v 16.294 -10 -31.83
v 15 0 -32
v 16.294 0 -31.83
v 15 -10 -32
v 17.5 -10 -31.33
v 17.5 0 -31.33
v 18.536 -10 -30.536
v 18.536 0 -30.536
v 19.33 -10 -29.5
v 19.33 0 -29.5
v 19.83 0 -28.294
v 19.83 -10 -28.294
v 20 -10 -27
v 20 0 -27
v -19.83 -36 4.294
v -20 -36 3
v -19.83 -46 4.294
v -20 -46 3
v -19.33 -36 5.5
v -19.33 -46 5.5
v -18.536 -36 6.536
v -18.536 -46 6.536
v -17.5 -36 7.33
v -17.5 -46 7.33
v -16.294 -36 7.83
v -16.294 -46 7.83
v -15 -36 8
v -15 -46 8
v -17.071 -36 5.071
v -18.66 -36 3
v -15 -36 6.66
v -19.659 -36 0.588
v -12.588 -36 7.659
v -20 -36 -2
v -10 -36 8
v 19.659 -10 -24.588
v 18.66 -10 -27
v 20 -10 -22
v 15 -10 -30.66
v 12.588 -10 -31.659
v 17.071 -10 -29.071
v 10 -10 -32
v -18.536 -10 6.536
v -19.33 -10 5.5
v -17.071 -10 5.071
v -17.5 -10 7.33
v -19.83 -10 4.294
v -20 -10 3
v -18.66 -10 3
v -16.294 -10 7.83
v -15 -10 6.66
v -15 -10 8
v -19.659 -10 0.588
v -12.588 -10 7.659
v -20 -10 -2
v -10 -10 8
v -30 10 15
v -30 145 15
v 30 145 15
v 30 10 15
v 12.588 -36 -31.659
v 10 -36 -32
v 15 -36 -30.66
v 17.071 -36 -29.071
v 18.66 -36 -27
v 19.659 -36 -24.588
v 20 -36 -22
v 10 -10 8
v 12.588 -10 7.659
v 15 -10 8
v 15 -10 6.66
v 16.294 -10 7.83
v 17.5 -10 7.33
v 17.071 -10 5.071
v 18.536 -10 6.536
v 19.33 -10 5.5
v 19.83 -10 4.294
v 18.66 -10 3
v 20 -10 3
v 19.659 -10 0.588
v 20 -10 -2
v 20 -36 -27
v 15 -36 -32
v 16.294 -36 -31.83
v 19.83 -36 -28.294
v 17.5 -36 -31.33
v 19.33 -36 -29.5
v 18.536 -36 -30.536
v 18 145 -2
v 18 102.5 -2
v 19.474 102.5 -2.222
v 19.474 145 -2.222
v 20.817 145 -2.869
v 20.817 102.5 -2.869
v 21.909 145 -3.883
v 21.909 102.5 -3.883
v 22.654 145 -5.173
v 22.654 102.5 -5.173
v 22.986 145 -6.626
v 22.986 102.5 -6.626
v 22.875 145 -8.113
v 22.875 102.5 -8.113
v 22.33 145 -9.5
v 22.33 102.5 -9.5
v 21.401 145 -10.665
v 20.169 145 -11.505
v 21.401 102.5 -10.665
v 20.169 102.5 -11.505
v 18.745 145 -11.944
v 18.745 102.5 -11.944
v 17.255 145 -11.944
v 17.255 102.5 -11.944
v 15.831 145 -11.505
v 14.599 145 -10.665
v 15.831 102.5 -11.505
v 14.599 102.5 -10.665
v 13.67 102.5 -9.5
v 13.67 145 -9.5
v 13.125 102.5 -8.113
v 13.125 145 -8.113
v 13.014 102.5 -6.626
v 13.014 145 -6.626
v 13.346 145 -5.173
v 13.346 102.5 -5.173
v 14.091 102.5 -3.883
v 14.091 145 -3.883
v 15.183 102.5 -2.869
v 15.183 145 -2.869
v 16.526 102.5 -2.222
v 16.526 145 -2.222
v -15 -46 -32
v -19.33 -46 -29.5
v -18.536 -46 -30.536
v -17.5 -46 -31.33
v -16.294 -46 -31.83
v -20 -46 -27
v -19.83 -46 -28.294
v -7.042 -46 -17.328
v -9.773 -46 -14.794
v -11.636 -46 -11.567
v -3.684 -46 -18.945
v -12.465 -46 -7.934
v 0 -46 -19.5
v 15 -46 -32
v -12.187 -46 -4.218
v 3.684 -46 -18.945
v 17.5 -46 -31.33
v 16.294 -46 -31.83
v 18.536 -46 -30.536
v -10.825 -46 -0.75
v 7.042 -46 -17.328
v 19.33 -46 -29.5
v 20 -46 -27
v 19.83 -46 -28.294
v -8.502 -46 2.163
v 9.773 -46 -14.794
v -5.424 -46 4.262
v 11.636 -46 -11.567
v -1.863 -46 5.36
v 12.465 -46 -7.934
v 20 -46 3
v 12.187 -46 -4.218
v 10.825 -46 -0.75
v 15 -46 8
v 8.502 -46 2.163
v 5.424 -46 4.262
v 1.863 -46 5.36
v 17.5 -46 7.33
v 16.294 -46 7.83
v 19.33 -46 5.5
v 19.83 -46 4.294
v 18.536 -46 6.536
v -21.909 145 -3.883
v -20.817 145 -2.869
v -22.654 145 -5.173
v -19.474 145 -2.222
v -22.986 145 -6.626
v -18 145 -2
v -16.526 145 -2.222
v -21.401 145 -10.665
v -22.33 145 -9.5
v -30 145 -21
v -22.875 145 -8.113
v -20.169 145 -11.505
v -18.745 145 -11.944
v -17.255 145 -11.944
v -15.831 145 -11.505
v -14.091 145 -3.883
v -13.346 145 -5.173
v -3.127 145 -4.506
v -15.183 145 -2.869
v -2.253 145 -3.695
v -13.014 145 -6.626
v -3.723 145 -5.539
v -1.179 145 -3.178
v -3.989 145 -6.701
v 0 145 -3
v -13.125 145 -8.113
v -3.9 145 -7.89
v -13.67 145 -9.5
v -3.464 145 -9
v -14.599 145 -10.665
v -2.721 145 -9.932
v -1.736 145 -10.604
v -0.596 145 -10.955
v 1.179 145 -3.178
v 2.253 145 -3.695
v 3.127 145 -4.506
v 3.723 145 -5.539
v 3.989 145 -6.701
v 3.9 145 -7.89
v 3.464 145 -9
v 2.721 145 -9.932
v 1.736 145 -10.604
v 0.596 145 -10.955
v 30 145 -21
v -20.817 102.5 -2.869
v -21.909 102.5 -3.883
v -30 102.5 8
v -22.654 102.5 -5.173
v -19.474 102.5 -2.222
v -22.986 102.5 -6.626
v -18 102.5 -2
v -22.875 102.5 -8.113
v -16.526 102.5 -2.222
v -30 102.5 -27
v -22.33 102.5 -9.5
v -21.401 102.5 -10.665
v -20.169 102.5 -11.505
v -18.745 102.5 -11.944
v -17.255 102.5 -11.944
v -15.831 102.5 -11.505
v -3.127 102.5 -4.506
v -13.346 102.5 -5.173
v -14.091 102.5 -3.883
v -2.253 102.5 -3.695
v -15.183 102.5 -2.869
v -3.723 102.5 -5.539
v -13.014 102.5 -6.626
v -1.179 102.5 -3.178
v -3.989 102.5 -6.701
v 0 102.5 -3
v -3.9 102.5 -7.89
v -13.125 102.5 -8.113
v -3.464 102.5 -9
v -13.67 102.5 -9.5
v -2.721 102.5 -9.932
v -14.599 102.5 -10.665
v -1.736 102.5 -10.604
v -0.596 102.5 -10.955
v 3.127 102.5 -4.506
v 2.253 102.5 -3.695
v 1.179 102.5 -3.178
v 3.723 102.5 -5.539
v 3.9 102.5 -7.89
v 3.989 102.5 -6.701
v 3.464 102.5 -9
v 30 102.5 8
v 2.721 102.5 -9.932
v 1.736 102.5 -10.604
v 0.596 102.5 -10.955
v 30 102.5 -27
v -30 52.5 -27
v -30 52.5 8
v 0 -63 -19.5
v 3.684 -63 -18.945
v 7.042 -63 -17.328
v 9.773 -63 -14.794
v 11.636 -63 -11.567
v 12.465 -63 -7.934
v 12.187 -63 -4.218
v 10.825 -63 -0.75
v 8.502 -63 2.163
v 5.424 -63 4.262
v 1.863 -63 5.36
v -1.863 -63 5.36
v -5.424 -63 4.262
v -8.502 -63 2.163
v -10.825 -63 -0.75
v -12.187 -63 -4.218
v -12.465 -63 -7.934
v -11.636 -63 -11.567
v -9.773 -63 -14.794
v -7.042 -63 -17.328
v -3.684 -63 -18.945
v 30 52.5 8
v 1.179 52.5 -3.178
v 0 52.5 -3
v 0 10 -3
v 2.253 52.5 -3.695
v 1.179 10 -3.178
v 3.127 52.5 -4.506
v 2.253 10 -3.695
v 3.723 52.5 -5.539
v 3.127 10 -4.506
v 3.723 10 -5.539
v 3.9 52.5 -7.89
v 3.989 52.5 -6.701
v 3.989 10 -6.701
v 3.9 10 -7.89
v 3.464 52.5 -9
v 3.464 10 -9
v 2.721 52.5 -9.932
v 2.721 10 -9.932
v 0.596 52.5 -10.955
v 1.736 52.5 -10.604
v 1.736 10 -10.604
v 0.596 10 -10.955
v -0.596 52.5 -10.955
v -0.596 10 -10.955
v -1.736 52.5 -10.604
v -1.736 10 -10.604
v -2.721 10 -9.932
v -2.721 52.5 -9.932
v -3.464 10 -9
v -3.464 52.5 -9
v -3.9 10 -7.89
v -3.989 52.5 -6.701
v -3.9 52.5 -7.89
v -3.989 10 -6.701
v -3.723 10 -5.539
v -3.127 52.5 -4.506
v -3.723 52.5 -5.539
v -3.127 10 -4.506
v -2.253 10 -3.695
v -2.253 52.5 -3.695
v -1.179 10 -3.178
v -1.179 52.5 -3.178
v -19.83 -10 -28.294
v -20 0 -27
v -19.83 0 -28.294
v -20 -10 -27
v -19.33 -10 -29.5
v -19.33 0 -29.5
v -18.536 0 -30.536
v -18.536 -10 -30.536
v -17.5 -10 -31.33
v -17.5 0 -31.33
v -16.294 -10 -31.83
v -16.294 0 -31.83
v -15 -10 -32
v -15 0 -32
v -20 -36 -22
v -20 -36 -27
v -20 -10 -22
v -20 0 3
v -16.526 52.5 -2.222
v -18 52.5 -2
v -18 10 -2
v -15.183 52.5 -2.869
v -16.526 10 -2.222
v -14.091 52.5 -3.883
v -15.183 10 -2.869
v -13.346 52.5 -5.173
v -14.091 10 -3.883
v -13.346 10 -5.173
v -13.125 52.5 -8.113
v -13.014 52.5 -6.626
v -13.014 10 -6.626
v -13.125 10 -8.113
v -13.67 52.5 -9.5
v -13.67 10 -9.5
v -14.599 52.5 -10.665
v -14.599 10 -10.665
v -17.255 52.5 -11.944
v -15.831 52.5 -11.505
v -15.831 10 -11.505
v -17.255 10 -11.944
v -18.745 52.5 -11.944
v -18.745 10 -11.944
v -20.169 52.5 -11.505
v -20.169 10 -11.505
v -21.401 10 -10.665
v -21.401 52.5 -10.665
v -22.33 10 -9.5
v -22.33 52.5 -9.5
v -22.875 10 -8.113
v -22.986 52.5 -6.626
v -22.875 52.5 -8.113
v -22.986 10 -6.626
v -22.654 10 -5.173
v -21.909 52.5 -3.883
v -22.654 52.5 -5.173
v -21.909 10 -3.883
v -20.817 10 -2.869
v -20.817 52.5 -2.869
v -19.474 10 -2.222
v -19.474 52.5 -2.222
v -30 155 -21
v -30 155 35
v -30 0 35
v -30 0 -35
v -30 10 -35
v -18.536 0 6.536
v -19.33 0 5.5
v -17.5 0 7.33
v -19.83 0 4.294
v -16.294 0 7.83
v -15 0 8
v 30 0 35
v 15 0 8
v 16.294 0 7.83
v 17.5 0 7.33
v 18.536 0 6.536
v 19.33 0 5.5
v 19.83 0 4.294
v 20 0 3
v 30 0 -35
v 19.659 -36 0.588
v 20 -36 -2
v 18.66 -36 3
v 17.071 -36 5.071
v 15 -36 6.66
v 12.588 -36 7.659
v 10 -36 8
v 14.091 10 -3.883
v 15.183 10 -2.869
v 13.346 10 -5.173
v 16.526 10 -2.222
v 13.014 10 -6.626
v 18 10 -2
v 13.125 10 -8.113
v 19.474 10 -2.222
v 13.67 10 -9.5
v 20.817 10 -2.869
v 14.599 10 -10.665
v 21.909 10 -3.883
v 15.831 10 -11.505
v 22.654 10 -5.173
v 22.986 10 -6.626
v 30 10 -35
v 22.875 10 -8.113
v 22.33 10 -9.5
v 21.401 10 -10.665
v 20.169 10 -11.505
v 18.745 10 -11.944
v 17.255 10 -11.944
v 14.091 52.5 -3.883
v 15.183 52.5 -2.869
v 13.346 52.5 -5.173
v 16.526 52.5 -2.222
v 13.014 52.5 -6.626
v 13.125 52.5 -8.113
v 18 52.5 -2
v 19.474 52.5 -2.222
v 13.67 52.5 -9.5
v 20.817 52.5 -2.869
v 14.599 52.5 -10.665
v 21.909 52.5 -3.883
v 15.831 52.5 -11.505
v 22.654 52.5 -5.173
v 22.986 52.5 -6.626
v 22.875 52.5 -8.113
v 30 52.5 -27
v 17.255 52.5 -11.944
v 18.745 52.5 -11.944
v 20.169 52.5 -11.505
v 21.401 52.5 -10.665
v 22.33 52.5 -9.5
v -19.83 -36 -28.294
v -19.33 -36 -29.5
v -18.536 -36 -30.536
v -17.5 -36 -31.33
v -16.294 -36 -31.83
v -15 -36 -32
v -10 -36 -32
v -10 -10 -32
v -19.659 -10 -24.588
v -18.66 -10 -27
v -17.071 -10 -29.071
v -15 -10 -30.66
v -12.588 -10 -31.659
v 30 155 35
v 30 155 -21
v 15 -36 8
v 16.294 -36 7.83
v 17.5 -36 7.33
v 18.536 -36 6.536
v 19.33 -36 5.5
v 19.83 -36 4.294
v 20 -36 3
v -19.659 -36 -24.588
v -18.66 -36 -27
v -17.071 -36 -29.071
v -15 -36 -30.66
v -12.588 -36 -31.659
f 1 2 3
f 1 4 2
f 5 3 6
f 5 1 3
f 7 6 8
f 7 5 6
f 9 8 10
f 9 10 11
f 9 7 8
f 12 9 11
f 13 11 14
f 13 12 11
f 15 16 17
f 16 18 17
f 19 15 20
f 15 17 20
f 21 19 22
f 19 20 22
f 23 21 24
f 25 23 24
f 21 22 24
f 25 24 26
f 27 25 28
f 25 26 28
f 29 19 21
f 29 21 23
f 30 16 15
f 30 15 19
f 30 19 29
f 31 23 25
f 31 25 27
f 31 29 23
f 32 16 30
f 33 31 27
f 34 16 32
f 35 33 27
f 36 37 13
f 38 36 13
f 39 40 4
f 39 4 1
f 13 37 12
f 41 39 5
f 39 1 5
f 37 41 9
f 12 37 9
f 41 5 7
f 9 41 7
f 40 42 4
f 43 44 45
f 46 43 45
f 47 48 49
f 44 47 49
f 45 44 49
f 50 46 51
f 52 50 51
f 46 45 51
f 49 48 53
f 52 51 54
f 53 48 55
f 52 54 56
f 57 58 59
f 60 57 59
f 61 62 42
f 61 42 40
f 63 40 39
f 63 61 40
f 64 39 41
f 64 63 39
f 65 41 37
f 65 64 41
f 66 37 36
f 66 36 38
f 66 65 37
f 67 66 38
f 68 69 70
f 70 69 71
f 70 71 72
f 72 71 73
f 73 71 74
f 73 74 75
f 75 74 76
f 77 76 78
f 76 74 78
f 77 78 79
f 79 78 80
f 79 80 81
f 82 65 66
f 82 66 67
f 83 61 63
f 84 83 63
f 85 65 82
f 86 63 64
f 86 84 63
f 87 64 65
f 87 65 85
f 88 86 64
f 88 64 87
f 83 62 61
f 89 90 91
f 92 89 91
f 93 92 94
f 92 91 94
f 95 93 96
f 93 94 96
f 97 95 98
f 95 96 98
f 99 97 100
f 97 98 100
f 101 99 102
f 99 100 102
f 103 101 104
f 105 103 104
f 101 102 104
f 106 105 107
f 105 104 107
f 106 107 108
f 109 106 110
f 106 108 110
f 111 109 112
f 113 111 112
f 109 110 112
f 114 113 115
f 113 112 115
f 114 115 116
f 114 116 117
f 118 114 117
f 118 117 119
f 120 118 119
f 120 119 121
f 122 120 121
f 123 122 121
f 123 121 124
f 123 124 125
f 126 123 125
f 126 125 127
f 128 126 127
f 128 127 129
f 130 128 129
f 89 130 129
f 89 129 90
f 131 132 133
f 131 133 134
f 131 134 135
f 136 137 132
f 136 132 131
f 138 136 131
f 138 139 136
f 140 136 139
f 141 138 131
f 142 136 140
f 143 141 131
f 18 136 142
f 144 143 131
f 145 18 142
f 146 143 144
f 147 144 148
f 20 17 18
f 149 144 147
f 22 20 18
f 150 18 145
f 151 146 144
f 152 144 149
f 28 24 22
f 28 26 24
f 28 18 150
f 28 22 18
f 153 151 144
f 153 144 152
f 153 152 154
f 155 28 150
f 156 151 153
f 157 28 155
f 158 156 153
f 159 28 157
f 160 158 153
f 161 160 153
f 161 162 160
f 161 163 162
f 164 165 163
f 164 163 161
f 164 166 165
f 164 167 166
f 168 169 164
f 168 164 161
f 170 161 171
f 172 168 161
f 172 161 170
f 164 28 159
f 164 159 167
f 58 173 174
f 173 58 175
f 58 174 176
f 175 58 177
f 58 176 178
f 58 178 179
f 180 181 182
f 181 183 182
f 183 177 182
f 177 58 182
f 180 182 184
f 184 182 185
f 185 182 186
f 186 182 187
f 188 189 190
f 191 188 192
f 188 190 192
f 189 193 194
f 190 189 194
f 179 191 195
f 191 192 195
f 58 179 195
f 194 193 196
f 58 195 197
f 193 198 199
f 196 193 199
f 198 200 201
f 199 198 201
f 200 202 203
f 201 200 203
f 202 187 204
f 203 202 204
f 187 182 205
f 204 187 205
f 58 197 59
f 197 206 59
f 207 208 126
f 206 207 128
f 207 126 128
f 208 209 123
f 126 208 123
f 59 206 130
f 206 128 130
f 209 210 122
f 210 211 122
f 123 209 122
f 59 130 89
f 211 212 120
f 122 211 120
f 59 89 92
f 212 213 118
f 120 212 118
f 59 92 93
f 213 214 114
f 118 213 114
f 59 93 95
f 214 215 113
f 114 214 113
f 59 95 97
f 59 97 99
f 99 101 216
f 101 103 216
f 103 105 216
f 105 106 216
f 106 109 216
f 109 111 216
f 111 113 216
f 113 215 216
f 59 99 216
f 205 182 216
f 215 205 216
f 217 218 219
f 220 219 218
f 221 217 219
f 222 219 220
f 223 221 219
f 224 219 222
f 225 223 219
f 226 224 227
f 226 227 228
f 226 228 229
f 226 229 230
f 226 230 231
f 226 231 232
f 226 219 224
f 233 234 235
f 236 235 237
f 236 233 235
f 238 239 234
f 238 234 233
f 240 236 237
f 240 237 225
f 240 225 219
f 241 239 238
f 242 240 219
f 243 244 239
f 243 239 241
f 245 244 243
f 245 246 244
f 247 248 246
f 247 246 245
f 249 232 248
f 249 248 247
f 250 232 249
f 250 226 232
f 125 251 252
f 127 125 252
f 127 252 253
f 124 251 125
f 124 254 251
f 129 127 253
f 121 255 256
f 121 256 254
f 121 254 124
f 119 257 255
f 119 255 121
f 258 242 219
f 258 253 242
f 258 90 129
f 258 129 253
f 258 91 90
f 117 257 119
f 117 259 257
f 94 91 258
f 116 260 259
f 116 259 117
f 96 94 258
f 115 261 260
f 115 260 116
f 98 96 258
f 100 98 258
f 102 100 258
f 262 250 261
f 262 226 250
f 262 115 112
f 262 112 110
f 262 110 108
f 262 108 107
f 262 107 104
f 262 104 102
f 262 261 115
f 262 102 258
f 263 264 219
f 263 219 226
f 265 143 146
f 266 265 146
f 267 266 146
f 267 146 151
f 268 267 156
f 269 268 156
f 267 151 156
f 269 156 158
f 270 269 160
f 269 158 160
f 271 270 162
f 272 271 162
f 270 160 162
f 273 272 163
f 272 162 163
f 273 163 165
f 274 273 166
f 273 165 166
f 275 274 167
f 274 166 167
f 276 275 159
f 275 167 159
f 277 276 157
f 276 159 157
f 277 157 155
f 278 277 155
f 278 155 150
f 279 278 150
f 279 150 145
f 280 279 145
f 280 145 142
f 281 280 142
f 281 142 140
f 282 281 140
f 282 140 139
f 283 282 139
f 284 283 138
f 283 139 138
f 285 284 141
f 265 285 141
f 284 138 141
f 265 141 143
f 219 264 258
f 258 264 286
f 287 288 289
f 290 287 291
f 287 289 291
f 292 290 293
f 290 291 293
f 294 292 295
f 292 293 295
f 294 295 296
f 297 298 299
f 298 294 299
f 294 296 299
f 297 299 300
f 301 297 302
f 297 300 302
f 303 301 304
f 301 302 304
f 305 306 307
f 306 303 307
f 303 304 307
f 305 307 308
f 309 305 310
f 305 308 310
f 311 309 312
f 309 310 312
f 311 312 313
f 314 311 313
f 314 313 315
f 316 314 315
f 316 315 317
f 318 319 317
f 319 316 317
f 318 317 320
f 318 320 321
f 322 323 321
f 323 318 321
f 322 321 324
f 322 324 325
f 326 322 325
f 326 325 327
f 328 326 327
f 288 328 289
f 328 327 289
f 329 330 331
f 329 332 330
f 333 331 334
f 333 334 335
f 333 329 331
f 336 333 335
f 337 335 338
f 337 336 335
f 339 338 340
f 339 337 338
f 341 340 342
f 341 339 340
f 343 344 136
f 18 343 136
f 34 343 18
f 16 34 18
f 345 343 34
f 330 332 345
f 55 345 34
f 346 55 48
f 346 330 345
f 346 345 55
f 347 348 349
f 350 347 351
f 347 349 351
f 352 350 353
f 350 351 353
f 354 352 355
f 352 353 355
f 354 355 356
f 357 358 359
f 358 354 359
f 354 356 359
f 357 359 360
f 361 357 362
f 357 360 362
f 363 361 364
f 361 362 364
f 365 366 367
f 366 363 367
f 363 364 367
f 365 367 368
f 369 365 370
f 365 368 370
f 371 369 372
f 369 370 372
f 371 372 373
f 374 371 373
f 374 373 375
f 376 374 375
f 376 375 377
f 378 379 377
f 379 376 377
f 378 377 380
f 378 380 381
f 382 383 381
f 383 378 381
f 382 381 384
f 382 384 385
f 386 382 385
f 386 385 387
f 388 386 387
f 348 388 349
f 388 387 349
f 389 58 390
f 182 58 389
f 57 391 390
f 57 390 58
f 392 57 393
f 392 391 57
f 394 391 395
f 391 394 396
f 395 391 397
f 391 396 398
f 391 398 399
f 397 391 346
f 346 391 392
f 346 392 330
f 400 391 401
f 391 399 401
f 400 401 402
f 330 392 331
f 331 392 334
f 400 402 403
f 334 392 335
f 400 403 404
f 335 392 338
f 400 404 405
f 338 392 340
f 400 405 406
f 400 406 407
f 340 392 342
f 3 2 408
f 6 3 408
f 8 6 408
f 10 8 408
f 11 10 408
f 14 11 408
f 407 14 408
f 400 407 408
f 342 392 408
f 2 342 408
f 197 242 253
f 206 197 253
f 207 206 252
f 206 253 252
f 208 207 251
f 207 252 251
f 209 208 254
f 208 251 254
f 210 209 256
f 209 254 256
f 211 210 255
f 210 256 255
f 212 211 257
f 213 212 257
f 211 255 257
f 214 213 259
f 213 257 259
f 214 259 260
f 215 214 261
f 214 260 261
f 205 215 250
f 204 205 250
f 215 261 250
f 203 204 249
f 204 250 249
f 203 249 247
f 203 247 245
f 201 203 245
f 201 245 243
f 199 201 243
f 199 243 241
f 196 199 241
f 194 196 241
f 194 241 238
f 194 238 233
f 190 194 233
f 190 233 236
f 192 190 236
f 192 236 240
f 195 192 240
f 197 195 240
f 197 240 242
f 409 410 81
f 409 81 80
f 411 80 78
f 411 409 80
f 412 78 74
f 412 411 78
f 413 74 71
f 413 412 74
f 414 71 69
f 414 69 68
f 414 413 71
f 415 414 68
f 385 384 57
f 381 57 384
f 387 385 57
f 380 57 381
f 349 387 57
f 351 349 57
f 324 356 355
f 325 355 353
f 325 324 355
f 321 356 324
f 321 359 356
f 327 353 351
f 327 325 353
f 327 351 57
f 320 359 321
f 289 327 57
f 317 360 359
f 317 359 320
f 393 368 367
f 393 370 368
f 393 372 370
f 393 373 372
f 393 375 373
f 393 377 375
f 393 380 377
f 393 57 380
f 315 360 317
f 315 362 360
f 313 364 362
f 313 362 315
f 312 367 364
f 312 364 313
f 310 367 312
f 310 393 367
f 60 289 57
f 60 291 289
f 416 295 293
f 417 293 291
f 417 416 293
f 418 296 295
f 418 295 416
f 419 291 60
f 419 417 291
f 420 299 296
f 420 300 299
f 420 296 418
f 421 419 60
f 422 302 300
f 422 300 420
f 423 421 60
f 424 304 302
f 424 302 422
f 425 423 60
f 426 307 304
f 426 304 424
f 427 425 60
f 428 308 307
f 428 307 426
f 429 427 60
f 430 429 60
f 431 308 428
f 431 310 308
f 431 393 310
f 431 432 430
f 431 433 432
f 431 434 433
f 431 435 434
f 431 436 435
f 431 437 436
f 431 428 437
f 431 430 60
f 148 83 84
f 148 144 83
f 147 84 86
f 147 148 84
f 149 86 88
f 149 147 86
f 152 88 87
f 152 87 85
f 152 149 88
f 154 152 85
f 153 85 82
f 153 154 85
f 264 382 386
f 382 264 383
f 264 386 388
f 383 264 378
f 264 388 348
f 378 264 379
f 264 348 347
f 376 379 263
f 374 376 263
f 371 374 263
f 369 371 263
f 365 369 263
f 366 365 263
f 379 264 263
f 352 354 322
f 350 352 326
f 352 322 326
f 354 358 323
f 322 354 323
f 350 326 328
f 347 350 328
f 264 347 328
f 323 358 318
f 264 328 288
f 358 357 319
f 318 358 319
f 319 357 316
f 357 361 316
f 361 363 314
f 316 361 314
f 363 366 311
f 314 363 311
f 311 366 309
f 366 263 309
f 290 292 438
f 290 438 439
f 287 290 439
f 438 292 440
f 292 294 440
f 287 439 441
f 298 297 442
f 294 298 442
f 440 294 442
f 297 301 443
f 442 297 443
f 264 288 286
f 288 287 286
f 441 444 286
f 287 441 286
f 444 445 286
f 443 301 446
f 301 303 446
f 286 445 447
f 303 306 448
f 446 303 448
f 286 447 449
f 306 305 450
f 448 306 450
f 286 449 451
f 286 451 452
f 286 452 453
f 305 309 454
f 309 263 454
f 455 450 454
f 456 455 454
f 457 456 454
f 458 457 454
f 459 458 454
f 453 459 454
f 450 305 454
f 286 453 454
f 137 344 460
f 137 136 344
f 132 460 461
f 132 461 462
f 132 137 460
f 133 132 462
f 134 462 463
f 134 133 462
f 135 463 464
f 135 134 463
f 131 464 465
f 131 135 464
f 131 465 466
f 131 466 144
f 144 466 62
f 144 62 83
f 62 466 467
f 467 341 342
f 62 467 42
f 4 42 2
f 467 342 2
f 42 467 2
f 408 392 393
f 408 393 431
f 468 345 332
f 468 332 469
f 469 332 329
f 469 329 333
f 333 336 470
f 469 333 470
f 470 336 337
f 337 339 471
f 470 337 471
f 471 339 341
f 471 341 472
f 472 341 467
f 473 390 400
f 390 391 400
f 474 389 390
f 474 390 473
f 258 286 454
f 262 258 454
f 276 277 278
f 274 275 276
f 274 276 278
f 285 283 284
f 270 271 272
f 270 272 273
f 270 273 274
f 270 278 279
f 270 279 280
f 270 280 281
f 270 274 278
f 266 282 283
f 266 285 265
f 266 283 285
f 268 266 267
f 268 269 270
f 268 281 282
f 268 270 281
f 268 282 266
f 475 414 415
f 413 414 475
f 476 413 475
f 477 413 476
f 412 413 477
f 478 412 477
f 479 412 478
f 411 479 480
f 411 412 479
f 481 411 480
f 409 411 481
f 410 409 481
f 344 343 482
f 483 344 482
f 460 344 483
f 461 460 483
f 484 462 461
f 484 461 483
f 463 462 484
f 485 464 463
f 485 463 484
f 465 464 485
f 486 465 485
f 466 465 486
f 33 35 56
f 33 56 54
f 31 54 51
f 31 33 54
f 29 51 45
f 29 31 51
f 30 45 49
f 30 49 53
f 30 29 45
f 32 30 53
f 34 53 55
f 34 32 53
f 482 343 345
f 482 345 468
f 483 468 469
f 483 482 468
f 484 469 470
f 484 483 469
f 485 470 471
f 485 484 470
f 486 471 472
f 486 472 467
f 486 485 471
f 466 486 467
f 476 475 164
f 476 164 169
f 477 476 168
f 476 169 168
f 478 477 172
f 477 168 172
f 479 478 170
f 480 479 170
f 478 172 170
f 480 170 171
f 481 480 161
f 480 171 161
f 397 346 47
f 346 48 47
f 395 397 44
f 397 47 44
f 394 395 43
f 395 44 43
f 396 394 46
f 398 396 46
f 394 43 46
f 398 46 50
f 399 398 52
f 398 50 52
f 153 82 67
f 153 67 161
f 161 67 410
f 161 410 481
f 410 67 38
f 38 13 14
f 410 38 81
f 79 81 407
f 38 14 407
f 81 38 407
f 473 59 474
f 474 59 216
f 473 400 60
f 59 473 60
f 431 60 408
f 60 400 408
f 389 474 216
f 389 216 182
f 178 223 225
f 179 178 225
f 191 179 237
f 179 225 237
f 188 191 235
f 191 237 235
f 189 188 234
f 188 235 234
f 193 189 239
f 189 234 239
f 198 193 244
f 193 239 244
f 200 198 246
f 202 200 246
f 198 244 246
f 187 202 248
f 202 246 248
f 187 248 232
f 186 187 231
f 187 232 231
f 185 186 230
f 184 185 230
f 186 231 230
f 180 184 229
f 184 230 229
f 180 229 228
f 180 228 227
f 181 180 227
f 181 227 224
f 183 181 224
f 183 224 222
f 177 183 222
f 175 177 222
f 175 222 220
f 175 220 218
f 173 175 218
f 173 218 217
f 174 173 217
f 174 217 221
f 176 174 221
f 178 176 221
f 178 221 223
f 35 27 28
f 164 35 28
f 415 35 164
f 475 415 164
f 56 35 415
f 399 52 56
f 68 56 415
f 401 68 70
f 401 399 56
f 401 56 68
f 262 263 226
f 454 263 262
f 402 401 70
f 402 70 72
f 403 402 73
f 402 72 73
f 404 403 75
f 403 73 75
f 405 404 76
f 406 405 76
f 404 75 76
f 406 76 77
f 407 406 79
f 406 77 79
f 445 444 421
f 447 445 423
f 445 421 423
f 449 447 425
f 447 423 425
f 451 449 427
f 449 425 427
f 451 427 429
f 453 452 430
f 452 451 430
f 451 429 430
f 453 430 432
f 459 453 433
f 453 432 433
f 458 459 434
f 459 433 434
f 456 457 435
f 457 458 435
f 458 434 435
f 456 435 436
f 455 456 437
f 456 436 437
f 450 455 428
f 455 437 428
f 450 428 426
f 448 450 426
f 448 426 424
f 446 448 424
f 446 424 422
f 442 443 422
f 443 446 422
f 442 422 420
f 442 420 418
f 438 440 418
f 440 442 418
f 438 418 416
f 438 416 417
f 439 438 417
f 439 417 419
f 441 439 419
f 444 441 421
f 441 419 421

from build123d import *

# Parameters (mm, degrees)
SKETCH1_W           = 60
SKETCH1_H           = 70
BOSS_EXTRUDE1_DEPTH = 10
SKETCH2_R           = 5
BOSS_EXTRUDE2_DEPTH = 135
SKETCH3_W           = 60
SKETCH3_H           = 70
BOSS_EXTRUDE3_DEPTH = 10
SKETCH4_R           = 4
BOSS_EXTRUDE4_DEPTH = 135
SKETCH6_W           = 60
SKETCH6_H           = 20
BOSS_EXTRUDE5_DEPTH = 135
SKETCH7_W           = 40
SKETCH7_H           = 40
BOSS_EXTRUDE6_DEPTH = 46
SKETCH8_R           = 12.5
BOSS_EXTRUDE7_DEPTH = 17
FILLET1_START       = -36
FILLET1_DEPTH       = 26
FILLET2_R           = 5
FILLET3_START       = -36
FILLET3_DEPTH       = 26
FILLET4_R           = 5
SKETCH9_W           = 60
SKETCH9_H           = 35
BOSS_EXTRUDE8_DEPTH = 50
SKETCH10_W          = 60
SKETCH10_H          = 10
CUT_EXTRUDE1_DEPTH  = 14


with BuildPart() as part:
    # Sketch1 → Boss-Extrude1 (new body)
    with BuildSketch(Plane(origin=(0, 0, 0), x_dir=(1, 0, 0), z_dir=(0, 1, 0))):
        Rectangle(SKETCH1_W, SKETCH1_H)
    extrude(amount=BOSS_EXTRUDE1_DEPTH)

    # Sketch2 → Boss-Extrude2 (add)
    with BuildSketch(Plane(origin=(0, 10, 0), x_dir=(1, 0, 0), z_dir=(0, 1, 0))):
        with Locations(Location((-18, 7, 0), (0, 0, 270))):
            Circle(SKETCH2_R)
        with Locations(Location((18, 7, 0), (0, 0, 270))):
            Circle(SKETCH2_R)
    extrude(amount=BOSS_EXTRUDE2_DEPTH)

    # Sketch3 → Boss-Extrude3 (add)
    with BuildSketch(Plane(origin=(0, 145, 0), x_dir=(1, 0, 0), z_dir=(0, 1, 0))):
        Rectangle(SKETCH3_W, SKETCH3_H)
    extrude(amount=BOSS_EXTRUDE3_DEPTH)

    # Sketch4 → Boss-Extrude4 (add)
    with BuildSketch(Plane(origin=(0, 10, 0), x_dir=(1, 0, 0), z_dir=(0, 1, 0))):
        with Locations(Location((0, 7, 0), (0, 0, 270))):
            Circle(SKETCH4_R)
    extrude(amount=BOSS_EXTRUDE4_DEPTH)

    # Sketch6 → Boss-Extrude5 (add)
    with BuildSketch(Plane(origin=(0, 10, 0), x_dir=(1, 0, 0), z_dir=(0, 1, 0))):
        with Locations((0, -25)):
            Rectangle(SKETCH6_W, SKETCH6_H)
    extrude(amount=BOSS_EXTRUDE5_DEPTH)

    # Sketch7 → Boss-Extrude6 (add)
    with BuildSketch(Plane.XZ):
        with Locations((0, -12)):
            Rectangle(SKETCH7_W, SKETCH7_H)
    extrude(amount=BOSS_EXTRUDE6_DEPTH)

    # Sketch8 → Boss-Extrude7 (add)
    with BuildSketch(Plane.XZ.offset(46)):
        with Locations(Location((0, -7, 0), (0, 0, 270))):
            Circle(SKETCH8_R)
    extrude(amount=BOSS_EXTRUDE7_DEPTH)

    # Fillet1: read off the stored shape, not the designer's step
    # Fillet1 outline → Fillet1 (cut)
    with BuildSketch(Plane(origin=(0, 0, 0), x_dir=(1, 0, 0), z_dir=(0, 1, 0)).offset(FILLET1_START)):
        with BuildLine():
            Line((-20, 32), (-20, 22))
            ThreePointArc((-20, 22), (-17.071067812, 29.071067812), (-10, 32))
            Line((-10, 32), (-20, 32))
        make_face()
    extrude(amount=FILLET1_DEPTH, mode=Mode.SUBTRACT)

    # Fillet2
    fillet2_edges = [part.edges().sort_by_distance(p)[0] for p in [
        (-20, -41, -32),
        (-20, -5, -32),
    ]]
    fillet(fillet2_edges, radius=FILLET2_R)

    # Fillet3: read off the stored shape, not the designer's step
    # Fillet3 outline → Fillet3 (cut)
    with BuildSketch(Plane(origin=(0, 0, 0), x_dir=(1, 0, 0), z_dir=(0, 1, 0)).offset(FILLET3_START)):
        with BuildLine():
            ThreePointArc((10, 32), (17.071067812, 29.071067812), (20, 22))
            Line((20, 22), (20, 32))
            Line((20, 32), (10, 32))
        make_face()
        with BuildLine():
            ThreePointArc((20, 2), (17.071067812, -5.071067812), (10, -8))
            Line((10, -8), (20, -8))
            Line((20, -8), (20, 2))
        make_face()
        with BuildLine():
            ThreePointArc((-10, -8), (-17.071067812, -5.071067812), (-20, 2))
            Line((-20, 2), (-20, -8))
            Line((-20, -8), (-10, -8))
        make_face()
    extrude(amount=FILLET3_DEPTH, mode=Mode.SUBTRACT)

    # Fillet4
    fillet4_edges = [part.edges().sort_by_distance(p)[0] for p in [
        (20, -41, -32),
        (20, -41, 8),
        (-20, -41, 8),
        (20, -5, 8),
        (20, -5, -32),
        (-20, -5, 8),
    ]]
    fillet(fillet4_edges, radius=FILLET4_R)

    # Sketch9 → Boss-Extrude8 (add)
    with BuildSketch(Plane(origin=(0, 52.5, 0), x_dir=(1, 0, 0), z_dir=(0, 1, 0))):
        with Locations((0, 9.5)):
            Rectangle(SKETCH9_W, SKETCH9_H)
    extrude(amount=BOSS_EXTRUDE8_DEPTH)

    # Sketch10 → Cut-Extrude1 (cut)
    with BuildSketch(Plane(origin=(0, 0, -35), x_dir=(-1, 0, 0), z_dir=(0, 0, -1))):
        with Locations((0, 150)):
            Rectangle(SKETCH10_W, SKETCH10_H)
    extrude(amount=-CUT_EXTRUDE1_DEPTH, mode=Mode.SUBTRACT)


solid = part.part
